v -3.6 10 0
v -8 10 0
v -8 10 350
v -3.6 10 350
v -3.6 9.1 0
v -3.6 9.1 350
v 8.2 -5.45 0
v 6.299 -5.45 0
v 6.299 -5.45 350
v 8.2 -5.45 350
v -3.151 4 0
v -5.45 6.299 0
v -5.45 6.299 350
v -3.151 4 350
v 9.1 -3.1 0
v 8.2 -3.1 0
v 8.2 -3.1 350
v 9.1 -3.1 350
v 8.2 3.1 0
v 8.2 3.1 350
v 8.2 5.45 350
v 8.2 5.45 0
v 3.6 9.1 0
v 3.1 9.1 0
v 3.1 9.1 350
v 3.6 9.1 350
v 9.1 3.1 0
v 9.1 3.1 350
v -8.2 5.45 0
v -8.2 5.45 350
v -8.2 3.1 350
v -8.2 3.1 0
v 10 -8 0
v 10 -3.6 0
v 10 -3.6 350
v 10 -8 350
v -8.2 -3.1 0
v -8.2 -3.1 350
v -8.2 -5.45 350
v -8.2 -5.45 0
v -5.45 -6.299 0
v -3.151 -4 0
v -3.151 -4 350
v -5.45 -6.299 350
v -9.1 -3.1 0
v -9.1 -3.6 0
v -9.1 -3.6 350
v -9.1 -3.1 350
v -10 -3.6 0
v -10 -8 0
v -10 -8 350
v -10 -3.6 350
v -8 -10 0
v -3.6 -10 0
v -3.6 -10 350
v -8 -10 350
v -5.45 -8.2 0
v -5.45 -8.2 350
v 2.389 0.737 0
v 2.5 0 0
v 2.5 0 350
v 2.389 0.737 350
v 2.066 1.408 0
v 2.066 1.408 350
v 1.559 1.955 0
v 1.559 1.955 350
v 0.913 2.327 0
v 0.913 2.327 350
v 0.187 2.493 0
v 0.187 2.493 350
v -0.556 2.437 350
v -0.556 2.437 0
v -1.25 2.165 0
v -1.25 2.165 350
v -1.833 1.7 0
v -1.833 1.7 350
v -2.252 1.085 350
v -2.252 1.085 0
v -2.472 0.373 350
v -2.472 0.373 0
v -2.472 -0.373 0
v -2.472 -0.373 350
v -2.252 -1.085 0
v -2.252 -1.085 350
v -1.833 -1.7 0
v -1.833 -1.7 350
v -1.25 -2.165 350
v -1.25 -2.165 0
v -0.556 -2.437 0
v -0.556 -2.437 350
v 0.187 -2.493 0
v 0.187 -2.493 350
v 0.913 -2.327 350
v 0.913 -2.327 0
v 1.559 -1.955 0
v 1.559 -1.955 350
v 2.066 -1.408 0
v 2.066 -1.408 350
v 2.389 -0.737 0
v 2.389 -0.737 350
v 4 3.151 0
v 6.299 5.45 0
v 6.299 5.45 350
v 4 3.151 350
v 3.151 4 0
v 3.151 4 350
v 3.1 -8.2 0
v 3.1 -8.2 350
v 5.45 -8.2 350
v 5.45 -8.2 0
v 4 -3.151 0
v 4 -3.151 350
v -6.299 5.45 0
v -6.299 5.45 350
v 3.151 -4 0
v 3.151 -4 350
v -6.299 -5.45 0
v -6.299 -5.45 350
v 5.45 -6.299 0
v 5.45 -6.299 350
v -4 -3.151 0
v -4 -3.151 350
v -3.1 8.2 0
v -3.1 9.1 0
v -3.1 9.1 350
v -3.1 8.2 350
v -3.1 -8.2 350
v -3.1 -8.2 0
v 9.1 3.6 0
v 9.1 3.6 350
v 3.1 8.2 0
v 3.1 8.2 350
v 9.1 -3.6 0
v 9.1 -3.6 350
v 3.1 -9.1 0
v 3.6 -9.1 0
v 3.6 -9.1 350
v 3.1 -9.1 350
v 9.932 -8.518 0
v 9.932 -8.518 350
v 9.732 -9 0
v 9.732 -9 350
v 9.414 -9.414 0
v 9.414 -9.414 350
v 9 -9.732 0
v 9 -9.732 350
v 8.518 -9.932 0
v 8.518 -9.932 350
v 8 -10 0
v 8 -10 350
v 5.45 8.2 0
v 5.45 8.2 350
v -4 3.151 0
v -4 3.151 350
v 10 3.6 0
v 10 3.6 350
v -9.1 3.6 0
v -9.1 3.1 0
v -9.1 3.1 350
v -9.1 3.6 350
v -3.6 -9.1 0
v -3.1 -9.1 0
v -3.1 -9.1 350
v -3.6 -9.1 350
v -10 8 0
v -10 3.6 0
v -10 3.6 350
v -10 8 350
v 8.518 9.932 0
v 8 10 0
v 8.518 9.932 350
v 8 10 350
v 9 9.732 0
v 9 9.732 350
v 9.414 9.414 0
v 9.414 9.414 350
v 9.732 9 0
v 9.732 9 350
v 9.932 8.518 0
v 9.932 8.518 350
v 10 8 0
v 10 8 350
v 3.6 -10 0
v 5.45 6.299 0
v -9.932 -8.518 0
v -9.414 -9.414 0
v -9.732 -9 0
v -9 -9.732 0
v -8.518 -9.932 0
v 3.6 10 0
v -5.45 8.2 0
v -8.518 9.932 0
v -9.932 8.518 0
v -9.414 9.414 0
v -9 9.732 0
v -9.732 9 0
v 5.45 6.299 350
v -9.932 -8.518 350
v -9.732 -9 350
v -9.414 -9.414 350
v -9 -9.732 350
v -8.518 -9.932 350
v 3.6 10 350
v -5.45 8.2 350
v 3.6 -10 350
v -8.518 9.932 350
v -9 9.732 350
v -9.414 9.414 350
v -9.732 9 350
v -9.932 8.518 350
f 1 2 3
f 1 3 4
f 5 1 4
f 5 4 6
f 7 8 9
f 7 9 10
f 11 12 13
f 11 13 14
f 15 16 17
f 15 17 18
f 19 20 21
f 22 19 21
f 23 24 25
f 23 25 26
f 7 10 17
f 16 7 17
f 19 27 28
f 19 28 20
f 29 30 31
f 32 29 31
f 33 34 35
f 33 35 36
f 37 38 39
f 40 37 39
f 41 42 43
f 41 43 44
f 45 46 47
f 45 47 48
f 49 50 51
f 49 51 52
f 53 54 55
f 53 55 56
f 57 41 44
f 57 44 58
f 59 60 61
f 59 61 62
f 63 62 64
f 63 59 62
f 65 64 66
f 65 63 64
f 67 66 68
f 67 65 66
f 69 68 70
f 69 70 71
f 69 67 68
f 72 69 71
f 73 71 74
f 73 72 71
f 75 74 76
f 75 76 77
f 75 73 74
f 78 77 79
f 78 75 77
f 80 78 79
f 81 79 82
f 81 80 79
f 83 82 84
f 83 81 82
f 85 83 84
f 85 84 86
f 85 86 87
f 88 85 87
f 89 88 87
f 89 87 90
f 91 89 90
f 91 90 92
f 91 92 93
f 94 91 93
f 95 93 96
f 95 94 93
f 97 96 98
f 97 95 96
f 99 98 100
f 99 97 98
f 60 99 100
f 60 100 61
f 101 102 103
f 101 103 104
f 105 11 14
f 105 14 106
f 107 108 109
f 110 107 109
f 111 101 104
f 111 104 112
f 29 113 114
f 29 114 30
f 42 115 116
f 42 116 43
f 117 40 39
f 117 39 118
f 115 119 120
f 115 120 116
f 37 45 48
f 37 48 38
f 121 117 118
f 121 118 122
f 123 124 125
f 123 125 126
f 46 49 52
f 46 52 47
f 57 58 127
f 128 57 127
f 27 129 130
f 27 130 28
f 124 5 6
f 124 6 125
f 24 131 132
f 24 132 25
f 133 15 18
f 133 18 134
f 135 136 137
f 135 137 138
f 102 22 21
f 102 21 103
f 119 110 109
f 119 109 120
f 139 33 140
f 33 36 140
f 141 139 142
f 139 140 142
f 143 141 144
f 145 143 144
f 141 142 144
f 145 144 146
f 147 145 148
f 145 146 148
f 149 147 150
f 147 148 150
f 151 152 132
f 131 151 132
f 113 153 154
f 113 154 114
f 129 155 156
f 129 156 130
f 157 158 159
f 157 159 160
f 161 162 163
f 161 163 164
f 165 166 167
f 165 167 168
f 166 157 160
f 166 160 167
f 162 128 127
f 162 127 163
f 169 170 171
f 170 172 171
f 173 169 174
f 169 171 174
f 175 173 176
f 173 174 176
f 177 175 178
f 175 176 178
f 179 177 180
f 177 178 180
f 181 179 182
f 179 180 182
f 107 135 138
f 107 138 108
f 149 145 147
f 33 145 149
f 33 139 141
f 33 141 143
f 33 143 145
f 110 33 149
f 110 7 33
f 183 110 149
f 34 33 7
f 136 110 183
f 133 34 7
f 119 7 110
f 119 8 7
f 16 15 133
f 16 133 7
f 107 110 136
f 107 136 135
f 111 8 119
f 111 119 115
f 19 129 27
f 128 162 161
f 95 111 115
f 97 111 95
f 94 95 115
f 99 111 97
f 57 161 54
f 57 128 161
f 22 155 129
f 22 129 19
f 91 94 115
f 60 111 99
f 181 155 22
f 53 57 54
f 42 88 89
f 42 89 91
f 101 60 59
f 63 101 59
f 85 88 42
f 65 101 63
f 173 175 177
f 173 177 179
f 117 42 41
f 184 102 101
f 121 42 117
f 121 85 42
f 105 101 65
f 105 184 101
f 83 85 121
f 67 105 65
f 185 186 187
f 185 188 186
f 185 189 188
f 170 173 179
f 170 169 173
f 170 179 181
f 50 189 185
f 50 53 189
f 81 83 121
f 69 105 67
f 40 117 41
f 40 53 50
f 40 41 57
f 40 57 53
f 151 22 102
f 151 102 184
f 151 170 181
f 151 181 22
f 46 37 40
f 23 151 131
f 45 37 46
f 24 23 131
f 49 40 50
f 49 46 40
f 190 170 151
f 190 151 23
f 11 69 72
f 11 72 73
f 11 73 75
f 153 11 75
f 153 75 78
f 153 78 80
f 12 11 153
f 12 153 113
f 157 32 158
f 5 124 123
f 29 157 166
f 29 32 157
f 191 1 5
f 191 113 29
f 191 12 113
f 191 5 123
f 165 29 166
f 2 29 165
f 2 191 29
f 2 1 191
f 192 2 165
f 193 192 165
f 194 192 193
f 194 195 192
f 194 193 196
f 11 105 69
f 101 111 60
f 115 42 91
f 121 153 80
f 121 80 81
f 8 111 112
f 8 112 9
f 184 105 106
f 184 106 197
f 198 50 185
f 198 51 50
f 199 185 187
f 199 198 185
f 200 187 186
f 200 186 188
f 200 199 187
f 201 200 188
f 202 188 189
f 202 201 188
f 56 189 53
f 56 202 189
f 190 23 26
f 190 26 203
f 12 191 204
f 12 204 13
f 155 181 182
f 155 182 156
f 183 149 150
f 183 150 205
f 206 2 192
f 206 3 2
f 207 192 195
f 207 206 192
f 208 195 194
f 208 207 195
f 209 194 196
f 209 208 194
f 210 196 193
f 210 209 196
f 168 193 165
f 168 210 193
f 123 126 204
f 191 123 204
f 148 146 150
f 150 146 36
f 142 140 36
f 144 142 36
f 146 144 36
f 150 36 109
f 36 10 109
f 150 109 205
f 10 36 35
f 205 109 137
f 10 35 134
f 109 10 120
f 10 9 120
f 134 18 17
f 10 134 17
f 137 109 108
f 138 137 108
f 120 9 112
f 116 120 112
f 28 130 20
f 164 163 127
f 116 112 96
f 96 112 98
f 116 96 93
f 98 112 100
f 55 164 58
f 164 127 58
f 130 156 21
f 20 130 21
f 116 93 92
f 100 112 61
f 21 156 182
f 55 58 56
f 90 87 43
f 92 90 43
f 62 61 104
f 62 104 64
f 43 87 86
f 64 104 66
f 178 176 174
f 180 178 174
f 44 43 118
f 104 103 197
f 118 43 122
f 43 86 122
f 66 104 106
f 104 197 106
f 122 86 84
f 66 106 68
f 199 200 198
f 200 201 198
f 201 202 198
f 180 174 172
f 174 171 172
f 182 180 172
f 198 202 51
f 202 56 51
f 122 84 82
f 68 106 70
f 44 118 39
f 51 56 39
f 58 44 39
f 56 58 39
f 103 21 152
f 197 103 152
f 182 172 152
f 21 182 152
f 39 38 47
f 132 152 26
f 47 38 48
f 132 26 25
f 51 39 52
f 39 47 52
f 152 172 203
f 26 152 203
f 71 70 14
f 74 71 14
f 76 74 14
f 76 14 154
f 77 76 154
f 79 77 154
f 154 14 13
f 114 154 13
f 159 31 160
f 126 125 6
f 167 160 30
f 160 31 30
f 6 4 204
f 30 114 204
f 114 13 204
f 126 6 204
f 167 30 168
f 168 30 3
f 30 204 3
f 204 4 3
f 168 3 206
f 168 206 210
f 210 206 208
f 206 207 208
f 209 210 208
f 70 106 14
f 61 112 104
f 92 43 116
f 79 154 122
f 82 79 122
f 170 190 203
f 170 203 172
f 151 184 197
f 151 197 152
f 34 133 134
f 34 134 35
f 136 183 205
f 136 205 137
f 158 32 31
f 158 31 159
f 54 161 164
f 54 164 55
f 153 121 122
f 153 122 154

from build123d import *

# Parameters (mm, degrees)
SKETCH_1_R      = 2.5
EXTRUDE_1_DEPTH = 350
FILLET_1_R      = 2


with BuildPart() as part:
    # 草图1 → 凸台-拉伸1 (new body)
    with BuildSketch(Plane.XY):
        Polygon((-3.151471863, 4), (3.151471863, 4), (5.45, 6.298528137), (5.45, 8.2), (3.1, 8.2), (3.1, 9.1), (3.6, 9.1), (3.6, 10), (10, 10), (10, 3.6), (9.1, 3.6), (9.1, 3.1), (8.2, 3.1), (8.2, 5.45), (6.298528137, 5.45), (4, 3.151471863), (4, -3.151471863), (6.298528137, -5.45), (8.2, -5.45), (8.2, -3.1), (9.1, -3.1), (9.1, -3.6), (10, -3.6), (10, -10), (3.6, -10), (3.6, -9.1), (3.1, -9.1), (3.1, -8.2), (5.45, -8.2), (5.45, -6.298528137), (3.151471863, -4), (-3.151471863, -4), (-5.45, -6.298528137), (-5.45, -8.2), (-3.1, -8.2), (-3.1, -9.1), (-3.6, -9.1), (-3.6, -10), (-10, -10), (-10, -3.6), (-9.1, -3.6), (-9.1, -3.1), (-8.2, -3.1), (-8.2, -5.45), (-6.298528137, -5.45), (-4, -3.151471863), (-4, 3.151471863), (-6.298528137, 5.45), (-8.2, 5.45), (-8.2, 3.1), (-9.1, 3.1), (-9.1, 3.6), (-10, 3.6), (-10, 10), (-3.6, 10), (-3.6, 9.1), (-3.1, 9.1), (-3.1, 8.2), (-5.45, 8.2), (-5.45, 6.298528137), align=None)
        Circle(SKETCH_1_R, mode=Mode.SUBTRACT)
    extrude(amount=EXTRUDE_1_DEPTH)

    # 圆角1
    fillet_1_edges = [part.edges().sort_by_distance(p)[0] for p in [
        (10, -10, 175),
        (-10, -10, 175),
        (-10, 10, 175),
        (10, 10, 175),
    ]]
    fillet(fillet_1_edges, radius=FILLET_1_R)


solid = part.part
